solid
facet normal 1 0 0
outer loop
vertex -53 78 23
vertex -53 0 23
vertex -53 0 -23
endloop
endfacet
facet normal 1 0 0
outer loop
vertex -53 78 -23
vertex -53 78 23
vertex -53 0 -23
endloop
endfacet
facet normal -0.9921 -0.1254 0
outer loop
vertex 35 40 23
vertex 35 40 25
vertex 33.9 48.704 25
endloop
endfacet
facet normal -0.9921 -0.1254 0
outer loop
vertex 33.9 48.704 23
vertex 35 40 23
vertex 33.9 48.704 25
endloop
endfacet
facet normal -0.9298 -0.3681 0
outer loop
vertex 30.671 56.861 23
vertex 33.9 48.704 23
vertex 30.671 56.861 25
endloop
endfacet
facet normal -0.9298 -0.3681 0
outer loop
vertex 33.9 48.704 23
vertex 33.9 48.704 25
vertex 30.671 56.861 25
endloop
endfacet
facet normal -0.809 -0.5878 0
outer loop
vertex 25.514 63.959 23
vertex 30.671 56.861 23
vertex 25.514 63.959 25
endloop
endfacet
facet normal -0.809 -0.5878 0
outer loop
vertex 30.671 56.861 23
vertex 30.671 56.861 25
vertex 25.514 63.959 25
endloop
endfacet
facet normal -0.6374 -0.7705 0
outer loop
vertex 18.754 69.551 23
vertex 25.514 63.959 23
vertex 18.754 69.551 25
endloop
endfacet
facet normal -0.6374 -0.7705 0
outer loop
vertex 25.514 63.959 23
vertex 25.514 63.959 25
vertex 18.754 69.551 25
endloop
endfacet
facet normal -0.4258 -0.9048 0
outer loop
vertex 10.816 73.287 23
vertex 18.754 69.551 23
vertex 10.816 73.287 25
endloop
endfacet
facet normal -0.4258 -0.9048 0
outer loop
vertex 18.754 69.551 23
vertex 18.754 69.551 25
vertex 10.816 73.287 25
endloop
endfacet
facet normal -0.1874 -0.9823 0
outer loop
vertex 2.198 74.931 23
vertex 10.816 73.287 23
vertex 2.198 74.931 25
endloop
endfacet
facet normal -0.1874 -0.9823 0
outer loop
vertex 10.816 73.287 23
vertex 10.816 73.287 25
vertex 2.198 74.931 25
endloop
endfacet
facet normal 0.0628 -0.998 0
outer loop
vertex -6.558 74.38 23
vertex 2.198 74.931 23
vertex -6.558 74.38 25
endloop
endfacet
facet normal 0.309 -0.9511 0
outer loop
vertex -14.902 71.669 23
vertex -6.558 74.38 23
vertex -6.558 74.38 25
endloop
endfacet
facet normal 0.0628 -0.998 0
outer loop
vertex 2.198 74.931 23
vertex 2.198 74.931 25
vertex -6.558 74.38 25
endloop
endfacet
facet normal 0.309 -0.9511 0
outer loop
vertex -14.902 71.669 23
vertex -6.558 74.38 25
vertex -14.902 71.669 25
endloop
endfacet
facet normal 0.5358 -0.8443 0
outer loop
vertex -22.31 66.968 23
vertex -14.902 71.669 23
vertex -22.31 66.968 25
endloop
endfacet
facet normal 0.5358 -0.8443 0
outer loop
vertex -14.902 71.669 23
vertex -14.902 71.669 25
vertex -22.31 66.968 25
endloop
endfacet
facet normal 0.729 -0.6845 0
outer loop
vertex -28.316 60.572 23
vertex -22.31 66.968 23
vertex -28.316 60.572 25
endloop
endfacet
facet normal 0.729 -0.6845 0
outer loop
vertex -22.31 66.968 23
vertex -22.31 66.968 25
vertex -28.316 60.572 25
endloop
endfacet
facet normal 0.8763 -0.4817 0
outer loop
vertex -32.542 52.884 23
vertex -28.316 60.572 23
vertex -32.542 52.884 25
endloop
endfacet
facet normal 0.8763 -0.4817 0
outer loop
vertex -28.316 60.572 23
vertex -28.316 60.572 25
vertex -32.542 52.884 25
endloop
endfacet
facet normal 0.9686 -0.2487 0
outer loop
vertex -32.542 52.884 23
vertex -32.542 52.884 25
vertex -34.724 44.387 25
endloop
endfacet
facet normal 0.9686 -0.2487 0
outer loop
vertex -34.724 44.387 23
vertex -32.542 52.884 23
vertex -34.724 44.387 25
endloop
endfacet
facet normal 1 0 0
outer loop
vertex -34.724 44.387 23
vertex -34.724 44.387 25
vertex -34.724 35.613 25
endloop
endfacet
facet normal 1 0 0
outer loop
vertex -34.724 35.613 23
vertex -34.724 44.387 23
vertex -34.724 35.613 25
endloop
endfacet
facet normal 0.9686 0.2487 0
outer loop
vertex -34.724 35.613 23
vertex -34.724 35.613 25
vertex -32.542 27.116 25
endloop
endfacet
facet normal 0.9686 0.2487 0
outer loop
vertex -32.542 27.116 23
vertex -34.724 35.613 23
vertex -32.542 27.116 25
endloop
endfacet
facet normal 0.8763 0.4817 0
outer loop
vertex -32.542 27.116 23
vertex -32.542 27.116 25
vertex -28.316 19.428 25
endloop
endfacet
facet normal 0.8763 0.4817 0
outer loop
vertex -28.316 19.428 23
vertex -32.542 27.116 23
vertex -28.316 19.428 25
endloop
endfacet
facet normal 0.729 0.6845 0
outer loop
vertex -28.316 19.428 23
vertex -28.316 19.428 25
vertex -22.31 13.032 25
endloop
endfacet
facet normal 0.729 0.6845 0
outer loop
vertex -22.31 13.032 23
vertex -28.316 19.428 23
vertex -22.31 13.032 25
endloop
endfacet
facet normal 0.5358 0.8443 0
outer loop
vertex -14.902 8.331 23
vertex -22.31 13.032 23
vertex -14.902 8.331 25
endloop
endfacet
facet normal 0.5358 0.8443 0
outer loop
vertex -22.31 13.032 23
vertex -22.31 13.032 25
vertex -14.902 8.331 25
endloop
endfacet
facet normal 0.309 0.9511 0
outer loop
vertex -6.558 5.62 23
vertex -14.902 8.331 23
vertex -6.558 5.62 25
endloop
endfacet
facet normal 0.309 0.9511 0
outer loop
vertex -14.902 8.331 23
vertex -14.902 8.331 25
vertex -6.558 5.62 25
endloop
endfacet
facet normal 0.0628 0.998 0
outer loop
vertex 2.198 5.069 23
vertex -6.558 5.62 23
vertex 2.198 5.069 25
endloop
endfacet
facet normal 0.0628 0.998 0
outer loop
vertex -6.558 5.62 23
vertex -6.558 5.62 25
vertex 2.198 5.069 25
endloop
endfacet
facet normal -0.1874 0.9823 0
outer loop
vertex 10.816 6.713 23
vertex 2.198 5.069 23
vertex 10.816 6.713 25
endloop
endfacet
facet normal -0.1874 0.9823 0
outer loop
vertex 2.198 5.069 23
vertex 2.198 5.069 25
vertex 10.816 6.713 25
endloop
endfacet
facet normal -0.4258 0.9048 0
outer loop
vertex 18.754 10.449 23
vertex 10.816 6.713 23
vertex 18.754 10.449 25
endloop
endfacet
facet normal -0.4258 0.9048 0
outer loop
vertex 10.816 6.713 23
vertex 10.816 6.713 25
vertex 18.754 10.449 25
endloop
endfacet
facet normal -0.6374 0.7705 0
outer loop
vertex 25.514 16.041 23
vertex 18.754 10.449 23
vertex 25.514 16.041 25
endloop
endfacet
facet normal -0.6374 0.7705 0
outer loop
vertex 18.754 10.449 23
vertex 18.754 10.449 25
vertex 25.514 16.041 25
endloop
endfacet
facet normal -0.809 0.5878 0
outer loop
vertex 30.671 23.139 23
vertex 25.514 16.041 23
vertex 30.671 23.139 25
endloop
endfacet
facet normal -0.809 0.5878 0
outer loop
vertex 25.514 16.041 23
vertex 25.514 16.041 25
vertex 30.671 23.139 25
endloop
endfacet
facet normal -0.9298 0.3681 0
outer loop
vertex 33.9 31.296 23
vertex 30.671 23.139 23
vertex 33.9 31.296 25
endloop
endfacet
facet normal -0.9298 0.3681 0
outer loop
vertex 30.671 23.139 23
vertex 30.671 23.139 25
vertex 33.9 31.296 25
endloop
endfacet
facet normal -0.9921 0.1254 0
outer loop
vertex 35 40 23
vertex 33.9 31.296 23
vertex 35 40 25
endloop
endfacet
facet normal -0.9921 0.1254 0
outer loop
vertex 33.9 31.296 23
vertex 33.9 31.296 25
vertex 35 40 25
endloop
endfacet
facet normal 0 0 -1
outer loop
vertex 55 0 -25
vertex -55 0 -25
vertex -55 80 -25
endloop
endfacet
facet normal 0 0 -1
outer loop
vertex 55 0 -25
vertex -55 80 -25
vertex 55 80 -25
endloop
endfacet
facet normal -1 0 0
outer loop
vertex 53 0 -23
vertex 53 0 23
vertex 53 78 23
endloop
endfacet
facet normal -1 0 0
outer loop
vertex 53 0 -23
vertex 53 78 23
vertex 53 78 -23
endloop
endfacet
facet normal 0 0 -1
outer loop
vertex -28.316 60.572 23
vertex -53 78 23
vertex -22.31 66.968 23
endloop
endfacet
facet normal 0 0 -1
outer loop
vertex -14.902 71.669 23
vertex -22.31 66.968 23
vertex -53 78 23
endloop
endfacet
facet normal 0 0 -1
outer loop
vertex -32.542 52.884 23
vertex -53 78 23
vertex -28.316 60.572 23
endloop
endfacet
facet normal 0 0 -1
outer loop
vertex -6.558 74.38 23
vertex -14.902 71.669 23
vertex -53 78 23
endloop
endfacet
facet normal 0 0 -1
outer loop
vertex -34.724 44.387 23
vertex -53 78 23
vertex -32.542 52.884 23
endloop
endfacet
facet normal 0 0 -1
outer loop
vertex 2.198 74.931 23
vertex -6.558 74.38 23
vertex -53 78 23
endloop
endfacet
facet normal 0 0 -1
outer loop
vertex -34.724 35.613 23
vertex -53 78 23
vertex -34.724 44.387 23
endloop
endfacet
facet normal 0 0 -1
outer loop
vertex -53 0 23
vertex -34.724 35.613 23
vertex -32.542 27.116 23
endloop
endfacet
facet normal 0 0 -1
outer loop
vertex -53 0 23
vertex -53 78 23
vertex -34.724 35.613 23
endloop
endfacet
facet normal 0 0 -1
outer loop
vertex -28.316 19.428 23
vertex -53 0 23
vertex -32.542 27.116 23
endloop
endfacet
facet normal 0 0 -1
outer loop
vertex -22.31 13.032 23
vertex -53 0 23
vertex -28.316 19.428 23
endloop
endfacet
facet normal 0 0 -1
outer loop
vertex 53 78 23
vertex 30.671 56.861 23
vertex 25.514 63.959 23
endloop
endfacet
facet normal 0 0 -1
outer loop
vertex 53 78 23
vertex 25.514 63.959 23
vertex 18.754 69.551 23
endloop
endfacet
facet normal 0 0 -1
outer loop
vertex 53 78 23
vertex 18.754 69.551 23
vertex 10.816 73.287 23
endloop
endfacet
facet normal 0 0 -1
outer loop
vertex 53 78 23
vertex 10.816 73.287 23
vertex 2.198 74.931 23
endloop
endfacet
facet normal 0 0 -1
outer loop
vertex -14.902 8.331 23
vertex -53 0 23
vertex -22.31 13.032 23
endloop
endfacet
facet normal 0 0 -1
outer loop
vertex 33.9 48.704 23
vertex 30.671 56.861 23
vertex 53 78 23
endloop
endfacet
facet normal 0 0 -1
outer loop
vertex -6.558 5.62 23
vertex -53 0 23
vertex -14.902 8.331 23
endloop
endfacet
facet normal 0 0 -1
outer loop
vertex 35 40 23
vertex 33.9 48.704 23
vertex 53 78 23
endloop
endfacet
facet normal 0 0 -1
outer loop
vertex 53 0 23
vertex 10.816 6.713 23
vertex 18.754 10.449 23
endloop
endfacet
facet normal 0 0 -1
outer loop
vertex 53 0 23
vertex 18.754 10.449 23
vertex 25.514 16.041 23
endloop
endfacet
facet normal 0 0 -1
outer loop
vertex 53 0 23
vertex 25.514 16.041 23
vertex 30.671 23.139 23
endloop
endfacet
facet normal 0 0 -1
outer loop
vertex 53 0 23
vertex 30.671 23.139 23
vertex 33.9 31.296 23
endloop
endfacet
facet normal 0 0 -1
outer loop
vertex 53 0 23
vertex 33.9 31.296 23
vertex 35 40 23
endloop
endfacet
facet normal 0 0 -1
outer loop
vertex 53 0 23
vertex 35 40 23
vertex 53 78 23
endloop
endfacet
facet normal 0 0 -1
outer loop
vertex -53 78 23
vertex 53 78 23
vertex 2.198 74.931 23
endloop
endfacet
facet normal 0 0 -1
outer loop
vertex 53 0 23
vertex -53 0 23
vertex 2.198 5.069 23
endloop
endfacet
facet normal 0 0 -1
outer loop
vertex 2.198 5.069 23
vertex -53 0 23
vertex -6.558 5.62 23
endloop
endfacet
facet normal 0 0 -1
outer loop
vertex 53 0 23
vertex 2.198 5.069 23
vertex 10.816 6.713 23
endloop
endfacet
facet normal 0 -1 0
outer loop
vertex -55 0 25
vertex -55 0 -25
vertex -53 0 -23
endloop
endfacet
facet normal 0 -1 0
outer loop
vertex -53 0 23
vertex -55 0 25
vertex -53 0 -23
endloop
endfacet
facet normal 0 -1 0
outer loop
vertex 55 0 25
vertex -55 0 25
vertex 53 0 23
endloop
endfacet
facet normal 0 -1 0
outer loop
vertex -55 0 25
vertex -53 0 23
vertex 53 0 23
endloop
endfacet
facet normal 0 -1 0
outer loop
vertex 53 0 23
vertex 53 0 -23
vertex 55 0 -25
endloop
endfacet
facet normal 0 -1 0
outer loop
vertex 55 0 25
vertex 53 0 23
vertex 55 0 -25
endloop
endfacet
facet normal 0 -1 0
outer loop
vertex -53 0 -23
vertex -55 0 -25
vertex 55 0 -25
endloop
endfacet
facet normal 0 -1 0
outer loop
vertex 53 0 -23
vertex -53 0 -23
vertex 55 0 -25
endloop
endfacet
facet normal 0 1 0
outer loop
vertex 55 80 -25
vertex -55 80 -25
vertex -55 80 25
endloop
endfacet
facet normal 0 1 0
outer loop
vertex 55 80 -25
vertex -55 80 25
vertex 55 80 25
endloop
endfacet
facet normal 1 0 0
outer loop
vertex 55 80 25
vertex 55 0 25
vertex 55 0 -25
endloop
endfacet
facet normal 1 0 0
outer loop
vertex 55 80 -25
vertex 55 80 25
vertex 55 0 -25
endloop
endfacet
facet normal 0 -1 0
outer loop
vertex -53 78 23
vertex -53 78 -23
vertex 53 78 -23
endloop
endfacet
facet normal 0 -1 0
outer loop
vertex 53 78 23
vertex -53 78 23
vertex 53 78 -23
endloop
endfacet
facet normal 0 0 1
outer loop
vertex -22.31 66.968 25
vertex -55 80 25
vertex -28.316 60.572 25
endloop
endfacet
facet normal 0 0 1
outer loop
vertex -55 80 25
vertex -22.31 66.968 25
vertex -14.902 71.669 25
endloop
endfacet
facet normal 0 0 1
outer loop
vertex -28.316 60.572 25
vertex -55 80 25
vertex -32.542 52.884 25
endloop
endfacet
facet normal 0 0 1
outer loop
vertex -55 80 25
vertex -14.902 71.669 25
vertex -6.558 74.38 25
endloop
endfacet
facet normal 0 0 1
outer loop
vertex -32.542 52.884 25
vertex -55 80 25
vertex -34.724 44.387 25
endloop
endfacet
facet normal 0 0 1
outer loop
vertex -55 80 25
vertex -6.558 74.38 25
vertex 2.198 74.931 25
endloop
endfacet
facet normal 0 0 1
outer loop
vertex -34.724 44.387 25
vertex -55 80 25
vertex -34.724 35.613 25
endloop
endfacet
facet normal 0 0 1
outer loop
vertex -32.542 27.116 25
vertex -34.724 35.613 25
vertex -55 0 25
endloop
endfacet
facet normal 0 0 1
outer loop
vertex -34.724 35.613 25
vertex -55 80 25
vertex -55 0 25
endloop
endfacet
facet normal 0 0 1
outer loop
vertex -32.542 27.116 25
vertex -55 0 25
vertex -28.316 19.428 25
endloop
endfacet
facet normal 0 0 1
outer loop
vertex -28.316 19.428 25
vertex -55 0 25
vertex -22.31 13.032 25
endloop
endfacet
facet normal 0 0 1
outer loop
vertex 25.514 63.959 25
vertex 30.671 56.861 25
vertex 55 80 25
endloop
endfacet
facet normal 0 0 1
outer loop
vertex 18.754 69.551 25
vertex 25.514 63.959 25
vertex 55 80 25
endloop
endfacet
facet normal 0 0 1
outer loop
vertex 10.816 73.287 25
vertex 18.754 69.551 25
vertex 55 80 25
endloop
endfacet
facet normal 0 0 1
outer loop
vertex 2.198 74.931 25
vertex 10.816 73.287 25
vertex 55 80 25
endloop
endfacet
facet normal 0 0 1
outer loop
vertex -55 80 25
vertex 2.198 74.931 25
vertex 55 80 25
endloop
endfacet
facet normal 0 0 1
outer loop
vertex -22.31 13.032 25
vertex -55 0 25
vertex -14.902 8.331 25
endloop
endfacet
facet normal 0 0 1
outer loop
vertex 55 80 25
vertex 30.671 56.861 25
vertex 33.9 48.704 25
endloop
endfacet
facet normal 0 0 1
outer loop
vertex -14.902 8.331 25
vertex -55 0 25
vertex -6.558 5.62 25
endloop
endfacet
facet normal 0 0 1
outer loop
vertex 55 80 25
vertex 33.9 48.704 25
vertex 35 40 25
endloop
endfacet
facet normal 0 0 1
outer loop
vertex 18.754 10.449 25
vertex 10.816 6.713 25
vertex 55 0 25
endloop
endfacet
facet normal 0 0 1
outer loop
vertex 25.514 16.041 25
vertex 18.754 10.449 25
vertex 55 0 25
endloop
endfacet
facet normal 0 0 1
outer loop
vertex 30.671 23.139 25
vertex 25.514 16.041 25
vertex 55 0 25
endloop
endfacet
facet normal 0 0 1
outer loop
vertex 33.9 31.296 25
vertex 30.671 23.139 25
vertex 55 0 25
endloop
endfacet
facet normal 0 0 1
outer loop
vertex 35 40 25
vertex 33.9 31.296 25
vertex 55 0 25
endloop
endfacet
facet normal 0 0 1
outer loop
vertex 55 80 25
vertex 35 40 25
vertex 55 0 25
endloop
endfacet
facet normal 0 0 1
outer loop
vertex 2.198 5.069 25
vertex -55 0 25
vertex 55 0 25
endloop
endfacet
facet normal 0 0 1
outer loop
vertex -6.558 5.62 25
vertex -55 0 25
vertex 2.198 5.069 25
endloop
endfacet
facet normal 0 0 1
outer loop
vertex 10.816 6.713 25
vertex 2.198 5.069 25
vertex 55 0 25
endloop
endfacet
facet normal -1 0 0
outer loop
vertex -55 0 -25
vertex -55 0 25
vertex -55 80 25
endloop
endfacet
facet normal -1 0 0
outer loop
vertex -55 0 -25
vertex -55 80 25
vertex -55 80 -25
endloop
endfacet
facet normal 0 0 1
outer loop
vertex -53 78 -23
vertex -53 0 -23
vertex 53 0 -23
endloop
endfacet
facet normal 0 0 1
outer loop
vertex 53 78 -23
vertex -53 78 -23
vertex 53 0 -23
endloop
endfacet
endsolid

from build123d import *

# Parameters (mm, degrees)
SKETCH_1_W          = 110
SKETCH_1_H          = 50
EXTRUDE_1_DEPTH     = 80
SHELL_1_T           = -2
SKETCH_2_R          = 35
CUT_EXTRUDE_1_DEPTH = 2


with BuildPart() as part:
    # 草图1 → 凸台-拉伸1 (new body)
    with BuildSketch(Plane(origin=(0, 0, 0), x_dir=(1, 0, 0), z_dir=(0, 1, 0))):
        Rectangle(SKETCH_1_W, SKETCH_1_H)
    extrude(amount=EXTRUDE_1_DEPTH)

    # 抽壳1
    shell_1_openings = [part.faces().sort_by_distance(p)[0] for p in [
        (0, 0, 0),
    ]]
    offset(amount=SHELL_1_T, openings=shell_1_openings, kind=Kind.INTERSECTION)

    # 草图2 → 切除-拉伸1 (cut)
    with BuildSketch(Plane.XY.offset(25)):
        with Locations((0, 40)):
            Circle(SKETCH_2_R)
    extrude(amount=-CUT_EXTRUDE_1_DEPTH, mode=Mode.SUBTRACT)


solid = part.part
